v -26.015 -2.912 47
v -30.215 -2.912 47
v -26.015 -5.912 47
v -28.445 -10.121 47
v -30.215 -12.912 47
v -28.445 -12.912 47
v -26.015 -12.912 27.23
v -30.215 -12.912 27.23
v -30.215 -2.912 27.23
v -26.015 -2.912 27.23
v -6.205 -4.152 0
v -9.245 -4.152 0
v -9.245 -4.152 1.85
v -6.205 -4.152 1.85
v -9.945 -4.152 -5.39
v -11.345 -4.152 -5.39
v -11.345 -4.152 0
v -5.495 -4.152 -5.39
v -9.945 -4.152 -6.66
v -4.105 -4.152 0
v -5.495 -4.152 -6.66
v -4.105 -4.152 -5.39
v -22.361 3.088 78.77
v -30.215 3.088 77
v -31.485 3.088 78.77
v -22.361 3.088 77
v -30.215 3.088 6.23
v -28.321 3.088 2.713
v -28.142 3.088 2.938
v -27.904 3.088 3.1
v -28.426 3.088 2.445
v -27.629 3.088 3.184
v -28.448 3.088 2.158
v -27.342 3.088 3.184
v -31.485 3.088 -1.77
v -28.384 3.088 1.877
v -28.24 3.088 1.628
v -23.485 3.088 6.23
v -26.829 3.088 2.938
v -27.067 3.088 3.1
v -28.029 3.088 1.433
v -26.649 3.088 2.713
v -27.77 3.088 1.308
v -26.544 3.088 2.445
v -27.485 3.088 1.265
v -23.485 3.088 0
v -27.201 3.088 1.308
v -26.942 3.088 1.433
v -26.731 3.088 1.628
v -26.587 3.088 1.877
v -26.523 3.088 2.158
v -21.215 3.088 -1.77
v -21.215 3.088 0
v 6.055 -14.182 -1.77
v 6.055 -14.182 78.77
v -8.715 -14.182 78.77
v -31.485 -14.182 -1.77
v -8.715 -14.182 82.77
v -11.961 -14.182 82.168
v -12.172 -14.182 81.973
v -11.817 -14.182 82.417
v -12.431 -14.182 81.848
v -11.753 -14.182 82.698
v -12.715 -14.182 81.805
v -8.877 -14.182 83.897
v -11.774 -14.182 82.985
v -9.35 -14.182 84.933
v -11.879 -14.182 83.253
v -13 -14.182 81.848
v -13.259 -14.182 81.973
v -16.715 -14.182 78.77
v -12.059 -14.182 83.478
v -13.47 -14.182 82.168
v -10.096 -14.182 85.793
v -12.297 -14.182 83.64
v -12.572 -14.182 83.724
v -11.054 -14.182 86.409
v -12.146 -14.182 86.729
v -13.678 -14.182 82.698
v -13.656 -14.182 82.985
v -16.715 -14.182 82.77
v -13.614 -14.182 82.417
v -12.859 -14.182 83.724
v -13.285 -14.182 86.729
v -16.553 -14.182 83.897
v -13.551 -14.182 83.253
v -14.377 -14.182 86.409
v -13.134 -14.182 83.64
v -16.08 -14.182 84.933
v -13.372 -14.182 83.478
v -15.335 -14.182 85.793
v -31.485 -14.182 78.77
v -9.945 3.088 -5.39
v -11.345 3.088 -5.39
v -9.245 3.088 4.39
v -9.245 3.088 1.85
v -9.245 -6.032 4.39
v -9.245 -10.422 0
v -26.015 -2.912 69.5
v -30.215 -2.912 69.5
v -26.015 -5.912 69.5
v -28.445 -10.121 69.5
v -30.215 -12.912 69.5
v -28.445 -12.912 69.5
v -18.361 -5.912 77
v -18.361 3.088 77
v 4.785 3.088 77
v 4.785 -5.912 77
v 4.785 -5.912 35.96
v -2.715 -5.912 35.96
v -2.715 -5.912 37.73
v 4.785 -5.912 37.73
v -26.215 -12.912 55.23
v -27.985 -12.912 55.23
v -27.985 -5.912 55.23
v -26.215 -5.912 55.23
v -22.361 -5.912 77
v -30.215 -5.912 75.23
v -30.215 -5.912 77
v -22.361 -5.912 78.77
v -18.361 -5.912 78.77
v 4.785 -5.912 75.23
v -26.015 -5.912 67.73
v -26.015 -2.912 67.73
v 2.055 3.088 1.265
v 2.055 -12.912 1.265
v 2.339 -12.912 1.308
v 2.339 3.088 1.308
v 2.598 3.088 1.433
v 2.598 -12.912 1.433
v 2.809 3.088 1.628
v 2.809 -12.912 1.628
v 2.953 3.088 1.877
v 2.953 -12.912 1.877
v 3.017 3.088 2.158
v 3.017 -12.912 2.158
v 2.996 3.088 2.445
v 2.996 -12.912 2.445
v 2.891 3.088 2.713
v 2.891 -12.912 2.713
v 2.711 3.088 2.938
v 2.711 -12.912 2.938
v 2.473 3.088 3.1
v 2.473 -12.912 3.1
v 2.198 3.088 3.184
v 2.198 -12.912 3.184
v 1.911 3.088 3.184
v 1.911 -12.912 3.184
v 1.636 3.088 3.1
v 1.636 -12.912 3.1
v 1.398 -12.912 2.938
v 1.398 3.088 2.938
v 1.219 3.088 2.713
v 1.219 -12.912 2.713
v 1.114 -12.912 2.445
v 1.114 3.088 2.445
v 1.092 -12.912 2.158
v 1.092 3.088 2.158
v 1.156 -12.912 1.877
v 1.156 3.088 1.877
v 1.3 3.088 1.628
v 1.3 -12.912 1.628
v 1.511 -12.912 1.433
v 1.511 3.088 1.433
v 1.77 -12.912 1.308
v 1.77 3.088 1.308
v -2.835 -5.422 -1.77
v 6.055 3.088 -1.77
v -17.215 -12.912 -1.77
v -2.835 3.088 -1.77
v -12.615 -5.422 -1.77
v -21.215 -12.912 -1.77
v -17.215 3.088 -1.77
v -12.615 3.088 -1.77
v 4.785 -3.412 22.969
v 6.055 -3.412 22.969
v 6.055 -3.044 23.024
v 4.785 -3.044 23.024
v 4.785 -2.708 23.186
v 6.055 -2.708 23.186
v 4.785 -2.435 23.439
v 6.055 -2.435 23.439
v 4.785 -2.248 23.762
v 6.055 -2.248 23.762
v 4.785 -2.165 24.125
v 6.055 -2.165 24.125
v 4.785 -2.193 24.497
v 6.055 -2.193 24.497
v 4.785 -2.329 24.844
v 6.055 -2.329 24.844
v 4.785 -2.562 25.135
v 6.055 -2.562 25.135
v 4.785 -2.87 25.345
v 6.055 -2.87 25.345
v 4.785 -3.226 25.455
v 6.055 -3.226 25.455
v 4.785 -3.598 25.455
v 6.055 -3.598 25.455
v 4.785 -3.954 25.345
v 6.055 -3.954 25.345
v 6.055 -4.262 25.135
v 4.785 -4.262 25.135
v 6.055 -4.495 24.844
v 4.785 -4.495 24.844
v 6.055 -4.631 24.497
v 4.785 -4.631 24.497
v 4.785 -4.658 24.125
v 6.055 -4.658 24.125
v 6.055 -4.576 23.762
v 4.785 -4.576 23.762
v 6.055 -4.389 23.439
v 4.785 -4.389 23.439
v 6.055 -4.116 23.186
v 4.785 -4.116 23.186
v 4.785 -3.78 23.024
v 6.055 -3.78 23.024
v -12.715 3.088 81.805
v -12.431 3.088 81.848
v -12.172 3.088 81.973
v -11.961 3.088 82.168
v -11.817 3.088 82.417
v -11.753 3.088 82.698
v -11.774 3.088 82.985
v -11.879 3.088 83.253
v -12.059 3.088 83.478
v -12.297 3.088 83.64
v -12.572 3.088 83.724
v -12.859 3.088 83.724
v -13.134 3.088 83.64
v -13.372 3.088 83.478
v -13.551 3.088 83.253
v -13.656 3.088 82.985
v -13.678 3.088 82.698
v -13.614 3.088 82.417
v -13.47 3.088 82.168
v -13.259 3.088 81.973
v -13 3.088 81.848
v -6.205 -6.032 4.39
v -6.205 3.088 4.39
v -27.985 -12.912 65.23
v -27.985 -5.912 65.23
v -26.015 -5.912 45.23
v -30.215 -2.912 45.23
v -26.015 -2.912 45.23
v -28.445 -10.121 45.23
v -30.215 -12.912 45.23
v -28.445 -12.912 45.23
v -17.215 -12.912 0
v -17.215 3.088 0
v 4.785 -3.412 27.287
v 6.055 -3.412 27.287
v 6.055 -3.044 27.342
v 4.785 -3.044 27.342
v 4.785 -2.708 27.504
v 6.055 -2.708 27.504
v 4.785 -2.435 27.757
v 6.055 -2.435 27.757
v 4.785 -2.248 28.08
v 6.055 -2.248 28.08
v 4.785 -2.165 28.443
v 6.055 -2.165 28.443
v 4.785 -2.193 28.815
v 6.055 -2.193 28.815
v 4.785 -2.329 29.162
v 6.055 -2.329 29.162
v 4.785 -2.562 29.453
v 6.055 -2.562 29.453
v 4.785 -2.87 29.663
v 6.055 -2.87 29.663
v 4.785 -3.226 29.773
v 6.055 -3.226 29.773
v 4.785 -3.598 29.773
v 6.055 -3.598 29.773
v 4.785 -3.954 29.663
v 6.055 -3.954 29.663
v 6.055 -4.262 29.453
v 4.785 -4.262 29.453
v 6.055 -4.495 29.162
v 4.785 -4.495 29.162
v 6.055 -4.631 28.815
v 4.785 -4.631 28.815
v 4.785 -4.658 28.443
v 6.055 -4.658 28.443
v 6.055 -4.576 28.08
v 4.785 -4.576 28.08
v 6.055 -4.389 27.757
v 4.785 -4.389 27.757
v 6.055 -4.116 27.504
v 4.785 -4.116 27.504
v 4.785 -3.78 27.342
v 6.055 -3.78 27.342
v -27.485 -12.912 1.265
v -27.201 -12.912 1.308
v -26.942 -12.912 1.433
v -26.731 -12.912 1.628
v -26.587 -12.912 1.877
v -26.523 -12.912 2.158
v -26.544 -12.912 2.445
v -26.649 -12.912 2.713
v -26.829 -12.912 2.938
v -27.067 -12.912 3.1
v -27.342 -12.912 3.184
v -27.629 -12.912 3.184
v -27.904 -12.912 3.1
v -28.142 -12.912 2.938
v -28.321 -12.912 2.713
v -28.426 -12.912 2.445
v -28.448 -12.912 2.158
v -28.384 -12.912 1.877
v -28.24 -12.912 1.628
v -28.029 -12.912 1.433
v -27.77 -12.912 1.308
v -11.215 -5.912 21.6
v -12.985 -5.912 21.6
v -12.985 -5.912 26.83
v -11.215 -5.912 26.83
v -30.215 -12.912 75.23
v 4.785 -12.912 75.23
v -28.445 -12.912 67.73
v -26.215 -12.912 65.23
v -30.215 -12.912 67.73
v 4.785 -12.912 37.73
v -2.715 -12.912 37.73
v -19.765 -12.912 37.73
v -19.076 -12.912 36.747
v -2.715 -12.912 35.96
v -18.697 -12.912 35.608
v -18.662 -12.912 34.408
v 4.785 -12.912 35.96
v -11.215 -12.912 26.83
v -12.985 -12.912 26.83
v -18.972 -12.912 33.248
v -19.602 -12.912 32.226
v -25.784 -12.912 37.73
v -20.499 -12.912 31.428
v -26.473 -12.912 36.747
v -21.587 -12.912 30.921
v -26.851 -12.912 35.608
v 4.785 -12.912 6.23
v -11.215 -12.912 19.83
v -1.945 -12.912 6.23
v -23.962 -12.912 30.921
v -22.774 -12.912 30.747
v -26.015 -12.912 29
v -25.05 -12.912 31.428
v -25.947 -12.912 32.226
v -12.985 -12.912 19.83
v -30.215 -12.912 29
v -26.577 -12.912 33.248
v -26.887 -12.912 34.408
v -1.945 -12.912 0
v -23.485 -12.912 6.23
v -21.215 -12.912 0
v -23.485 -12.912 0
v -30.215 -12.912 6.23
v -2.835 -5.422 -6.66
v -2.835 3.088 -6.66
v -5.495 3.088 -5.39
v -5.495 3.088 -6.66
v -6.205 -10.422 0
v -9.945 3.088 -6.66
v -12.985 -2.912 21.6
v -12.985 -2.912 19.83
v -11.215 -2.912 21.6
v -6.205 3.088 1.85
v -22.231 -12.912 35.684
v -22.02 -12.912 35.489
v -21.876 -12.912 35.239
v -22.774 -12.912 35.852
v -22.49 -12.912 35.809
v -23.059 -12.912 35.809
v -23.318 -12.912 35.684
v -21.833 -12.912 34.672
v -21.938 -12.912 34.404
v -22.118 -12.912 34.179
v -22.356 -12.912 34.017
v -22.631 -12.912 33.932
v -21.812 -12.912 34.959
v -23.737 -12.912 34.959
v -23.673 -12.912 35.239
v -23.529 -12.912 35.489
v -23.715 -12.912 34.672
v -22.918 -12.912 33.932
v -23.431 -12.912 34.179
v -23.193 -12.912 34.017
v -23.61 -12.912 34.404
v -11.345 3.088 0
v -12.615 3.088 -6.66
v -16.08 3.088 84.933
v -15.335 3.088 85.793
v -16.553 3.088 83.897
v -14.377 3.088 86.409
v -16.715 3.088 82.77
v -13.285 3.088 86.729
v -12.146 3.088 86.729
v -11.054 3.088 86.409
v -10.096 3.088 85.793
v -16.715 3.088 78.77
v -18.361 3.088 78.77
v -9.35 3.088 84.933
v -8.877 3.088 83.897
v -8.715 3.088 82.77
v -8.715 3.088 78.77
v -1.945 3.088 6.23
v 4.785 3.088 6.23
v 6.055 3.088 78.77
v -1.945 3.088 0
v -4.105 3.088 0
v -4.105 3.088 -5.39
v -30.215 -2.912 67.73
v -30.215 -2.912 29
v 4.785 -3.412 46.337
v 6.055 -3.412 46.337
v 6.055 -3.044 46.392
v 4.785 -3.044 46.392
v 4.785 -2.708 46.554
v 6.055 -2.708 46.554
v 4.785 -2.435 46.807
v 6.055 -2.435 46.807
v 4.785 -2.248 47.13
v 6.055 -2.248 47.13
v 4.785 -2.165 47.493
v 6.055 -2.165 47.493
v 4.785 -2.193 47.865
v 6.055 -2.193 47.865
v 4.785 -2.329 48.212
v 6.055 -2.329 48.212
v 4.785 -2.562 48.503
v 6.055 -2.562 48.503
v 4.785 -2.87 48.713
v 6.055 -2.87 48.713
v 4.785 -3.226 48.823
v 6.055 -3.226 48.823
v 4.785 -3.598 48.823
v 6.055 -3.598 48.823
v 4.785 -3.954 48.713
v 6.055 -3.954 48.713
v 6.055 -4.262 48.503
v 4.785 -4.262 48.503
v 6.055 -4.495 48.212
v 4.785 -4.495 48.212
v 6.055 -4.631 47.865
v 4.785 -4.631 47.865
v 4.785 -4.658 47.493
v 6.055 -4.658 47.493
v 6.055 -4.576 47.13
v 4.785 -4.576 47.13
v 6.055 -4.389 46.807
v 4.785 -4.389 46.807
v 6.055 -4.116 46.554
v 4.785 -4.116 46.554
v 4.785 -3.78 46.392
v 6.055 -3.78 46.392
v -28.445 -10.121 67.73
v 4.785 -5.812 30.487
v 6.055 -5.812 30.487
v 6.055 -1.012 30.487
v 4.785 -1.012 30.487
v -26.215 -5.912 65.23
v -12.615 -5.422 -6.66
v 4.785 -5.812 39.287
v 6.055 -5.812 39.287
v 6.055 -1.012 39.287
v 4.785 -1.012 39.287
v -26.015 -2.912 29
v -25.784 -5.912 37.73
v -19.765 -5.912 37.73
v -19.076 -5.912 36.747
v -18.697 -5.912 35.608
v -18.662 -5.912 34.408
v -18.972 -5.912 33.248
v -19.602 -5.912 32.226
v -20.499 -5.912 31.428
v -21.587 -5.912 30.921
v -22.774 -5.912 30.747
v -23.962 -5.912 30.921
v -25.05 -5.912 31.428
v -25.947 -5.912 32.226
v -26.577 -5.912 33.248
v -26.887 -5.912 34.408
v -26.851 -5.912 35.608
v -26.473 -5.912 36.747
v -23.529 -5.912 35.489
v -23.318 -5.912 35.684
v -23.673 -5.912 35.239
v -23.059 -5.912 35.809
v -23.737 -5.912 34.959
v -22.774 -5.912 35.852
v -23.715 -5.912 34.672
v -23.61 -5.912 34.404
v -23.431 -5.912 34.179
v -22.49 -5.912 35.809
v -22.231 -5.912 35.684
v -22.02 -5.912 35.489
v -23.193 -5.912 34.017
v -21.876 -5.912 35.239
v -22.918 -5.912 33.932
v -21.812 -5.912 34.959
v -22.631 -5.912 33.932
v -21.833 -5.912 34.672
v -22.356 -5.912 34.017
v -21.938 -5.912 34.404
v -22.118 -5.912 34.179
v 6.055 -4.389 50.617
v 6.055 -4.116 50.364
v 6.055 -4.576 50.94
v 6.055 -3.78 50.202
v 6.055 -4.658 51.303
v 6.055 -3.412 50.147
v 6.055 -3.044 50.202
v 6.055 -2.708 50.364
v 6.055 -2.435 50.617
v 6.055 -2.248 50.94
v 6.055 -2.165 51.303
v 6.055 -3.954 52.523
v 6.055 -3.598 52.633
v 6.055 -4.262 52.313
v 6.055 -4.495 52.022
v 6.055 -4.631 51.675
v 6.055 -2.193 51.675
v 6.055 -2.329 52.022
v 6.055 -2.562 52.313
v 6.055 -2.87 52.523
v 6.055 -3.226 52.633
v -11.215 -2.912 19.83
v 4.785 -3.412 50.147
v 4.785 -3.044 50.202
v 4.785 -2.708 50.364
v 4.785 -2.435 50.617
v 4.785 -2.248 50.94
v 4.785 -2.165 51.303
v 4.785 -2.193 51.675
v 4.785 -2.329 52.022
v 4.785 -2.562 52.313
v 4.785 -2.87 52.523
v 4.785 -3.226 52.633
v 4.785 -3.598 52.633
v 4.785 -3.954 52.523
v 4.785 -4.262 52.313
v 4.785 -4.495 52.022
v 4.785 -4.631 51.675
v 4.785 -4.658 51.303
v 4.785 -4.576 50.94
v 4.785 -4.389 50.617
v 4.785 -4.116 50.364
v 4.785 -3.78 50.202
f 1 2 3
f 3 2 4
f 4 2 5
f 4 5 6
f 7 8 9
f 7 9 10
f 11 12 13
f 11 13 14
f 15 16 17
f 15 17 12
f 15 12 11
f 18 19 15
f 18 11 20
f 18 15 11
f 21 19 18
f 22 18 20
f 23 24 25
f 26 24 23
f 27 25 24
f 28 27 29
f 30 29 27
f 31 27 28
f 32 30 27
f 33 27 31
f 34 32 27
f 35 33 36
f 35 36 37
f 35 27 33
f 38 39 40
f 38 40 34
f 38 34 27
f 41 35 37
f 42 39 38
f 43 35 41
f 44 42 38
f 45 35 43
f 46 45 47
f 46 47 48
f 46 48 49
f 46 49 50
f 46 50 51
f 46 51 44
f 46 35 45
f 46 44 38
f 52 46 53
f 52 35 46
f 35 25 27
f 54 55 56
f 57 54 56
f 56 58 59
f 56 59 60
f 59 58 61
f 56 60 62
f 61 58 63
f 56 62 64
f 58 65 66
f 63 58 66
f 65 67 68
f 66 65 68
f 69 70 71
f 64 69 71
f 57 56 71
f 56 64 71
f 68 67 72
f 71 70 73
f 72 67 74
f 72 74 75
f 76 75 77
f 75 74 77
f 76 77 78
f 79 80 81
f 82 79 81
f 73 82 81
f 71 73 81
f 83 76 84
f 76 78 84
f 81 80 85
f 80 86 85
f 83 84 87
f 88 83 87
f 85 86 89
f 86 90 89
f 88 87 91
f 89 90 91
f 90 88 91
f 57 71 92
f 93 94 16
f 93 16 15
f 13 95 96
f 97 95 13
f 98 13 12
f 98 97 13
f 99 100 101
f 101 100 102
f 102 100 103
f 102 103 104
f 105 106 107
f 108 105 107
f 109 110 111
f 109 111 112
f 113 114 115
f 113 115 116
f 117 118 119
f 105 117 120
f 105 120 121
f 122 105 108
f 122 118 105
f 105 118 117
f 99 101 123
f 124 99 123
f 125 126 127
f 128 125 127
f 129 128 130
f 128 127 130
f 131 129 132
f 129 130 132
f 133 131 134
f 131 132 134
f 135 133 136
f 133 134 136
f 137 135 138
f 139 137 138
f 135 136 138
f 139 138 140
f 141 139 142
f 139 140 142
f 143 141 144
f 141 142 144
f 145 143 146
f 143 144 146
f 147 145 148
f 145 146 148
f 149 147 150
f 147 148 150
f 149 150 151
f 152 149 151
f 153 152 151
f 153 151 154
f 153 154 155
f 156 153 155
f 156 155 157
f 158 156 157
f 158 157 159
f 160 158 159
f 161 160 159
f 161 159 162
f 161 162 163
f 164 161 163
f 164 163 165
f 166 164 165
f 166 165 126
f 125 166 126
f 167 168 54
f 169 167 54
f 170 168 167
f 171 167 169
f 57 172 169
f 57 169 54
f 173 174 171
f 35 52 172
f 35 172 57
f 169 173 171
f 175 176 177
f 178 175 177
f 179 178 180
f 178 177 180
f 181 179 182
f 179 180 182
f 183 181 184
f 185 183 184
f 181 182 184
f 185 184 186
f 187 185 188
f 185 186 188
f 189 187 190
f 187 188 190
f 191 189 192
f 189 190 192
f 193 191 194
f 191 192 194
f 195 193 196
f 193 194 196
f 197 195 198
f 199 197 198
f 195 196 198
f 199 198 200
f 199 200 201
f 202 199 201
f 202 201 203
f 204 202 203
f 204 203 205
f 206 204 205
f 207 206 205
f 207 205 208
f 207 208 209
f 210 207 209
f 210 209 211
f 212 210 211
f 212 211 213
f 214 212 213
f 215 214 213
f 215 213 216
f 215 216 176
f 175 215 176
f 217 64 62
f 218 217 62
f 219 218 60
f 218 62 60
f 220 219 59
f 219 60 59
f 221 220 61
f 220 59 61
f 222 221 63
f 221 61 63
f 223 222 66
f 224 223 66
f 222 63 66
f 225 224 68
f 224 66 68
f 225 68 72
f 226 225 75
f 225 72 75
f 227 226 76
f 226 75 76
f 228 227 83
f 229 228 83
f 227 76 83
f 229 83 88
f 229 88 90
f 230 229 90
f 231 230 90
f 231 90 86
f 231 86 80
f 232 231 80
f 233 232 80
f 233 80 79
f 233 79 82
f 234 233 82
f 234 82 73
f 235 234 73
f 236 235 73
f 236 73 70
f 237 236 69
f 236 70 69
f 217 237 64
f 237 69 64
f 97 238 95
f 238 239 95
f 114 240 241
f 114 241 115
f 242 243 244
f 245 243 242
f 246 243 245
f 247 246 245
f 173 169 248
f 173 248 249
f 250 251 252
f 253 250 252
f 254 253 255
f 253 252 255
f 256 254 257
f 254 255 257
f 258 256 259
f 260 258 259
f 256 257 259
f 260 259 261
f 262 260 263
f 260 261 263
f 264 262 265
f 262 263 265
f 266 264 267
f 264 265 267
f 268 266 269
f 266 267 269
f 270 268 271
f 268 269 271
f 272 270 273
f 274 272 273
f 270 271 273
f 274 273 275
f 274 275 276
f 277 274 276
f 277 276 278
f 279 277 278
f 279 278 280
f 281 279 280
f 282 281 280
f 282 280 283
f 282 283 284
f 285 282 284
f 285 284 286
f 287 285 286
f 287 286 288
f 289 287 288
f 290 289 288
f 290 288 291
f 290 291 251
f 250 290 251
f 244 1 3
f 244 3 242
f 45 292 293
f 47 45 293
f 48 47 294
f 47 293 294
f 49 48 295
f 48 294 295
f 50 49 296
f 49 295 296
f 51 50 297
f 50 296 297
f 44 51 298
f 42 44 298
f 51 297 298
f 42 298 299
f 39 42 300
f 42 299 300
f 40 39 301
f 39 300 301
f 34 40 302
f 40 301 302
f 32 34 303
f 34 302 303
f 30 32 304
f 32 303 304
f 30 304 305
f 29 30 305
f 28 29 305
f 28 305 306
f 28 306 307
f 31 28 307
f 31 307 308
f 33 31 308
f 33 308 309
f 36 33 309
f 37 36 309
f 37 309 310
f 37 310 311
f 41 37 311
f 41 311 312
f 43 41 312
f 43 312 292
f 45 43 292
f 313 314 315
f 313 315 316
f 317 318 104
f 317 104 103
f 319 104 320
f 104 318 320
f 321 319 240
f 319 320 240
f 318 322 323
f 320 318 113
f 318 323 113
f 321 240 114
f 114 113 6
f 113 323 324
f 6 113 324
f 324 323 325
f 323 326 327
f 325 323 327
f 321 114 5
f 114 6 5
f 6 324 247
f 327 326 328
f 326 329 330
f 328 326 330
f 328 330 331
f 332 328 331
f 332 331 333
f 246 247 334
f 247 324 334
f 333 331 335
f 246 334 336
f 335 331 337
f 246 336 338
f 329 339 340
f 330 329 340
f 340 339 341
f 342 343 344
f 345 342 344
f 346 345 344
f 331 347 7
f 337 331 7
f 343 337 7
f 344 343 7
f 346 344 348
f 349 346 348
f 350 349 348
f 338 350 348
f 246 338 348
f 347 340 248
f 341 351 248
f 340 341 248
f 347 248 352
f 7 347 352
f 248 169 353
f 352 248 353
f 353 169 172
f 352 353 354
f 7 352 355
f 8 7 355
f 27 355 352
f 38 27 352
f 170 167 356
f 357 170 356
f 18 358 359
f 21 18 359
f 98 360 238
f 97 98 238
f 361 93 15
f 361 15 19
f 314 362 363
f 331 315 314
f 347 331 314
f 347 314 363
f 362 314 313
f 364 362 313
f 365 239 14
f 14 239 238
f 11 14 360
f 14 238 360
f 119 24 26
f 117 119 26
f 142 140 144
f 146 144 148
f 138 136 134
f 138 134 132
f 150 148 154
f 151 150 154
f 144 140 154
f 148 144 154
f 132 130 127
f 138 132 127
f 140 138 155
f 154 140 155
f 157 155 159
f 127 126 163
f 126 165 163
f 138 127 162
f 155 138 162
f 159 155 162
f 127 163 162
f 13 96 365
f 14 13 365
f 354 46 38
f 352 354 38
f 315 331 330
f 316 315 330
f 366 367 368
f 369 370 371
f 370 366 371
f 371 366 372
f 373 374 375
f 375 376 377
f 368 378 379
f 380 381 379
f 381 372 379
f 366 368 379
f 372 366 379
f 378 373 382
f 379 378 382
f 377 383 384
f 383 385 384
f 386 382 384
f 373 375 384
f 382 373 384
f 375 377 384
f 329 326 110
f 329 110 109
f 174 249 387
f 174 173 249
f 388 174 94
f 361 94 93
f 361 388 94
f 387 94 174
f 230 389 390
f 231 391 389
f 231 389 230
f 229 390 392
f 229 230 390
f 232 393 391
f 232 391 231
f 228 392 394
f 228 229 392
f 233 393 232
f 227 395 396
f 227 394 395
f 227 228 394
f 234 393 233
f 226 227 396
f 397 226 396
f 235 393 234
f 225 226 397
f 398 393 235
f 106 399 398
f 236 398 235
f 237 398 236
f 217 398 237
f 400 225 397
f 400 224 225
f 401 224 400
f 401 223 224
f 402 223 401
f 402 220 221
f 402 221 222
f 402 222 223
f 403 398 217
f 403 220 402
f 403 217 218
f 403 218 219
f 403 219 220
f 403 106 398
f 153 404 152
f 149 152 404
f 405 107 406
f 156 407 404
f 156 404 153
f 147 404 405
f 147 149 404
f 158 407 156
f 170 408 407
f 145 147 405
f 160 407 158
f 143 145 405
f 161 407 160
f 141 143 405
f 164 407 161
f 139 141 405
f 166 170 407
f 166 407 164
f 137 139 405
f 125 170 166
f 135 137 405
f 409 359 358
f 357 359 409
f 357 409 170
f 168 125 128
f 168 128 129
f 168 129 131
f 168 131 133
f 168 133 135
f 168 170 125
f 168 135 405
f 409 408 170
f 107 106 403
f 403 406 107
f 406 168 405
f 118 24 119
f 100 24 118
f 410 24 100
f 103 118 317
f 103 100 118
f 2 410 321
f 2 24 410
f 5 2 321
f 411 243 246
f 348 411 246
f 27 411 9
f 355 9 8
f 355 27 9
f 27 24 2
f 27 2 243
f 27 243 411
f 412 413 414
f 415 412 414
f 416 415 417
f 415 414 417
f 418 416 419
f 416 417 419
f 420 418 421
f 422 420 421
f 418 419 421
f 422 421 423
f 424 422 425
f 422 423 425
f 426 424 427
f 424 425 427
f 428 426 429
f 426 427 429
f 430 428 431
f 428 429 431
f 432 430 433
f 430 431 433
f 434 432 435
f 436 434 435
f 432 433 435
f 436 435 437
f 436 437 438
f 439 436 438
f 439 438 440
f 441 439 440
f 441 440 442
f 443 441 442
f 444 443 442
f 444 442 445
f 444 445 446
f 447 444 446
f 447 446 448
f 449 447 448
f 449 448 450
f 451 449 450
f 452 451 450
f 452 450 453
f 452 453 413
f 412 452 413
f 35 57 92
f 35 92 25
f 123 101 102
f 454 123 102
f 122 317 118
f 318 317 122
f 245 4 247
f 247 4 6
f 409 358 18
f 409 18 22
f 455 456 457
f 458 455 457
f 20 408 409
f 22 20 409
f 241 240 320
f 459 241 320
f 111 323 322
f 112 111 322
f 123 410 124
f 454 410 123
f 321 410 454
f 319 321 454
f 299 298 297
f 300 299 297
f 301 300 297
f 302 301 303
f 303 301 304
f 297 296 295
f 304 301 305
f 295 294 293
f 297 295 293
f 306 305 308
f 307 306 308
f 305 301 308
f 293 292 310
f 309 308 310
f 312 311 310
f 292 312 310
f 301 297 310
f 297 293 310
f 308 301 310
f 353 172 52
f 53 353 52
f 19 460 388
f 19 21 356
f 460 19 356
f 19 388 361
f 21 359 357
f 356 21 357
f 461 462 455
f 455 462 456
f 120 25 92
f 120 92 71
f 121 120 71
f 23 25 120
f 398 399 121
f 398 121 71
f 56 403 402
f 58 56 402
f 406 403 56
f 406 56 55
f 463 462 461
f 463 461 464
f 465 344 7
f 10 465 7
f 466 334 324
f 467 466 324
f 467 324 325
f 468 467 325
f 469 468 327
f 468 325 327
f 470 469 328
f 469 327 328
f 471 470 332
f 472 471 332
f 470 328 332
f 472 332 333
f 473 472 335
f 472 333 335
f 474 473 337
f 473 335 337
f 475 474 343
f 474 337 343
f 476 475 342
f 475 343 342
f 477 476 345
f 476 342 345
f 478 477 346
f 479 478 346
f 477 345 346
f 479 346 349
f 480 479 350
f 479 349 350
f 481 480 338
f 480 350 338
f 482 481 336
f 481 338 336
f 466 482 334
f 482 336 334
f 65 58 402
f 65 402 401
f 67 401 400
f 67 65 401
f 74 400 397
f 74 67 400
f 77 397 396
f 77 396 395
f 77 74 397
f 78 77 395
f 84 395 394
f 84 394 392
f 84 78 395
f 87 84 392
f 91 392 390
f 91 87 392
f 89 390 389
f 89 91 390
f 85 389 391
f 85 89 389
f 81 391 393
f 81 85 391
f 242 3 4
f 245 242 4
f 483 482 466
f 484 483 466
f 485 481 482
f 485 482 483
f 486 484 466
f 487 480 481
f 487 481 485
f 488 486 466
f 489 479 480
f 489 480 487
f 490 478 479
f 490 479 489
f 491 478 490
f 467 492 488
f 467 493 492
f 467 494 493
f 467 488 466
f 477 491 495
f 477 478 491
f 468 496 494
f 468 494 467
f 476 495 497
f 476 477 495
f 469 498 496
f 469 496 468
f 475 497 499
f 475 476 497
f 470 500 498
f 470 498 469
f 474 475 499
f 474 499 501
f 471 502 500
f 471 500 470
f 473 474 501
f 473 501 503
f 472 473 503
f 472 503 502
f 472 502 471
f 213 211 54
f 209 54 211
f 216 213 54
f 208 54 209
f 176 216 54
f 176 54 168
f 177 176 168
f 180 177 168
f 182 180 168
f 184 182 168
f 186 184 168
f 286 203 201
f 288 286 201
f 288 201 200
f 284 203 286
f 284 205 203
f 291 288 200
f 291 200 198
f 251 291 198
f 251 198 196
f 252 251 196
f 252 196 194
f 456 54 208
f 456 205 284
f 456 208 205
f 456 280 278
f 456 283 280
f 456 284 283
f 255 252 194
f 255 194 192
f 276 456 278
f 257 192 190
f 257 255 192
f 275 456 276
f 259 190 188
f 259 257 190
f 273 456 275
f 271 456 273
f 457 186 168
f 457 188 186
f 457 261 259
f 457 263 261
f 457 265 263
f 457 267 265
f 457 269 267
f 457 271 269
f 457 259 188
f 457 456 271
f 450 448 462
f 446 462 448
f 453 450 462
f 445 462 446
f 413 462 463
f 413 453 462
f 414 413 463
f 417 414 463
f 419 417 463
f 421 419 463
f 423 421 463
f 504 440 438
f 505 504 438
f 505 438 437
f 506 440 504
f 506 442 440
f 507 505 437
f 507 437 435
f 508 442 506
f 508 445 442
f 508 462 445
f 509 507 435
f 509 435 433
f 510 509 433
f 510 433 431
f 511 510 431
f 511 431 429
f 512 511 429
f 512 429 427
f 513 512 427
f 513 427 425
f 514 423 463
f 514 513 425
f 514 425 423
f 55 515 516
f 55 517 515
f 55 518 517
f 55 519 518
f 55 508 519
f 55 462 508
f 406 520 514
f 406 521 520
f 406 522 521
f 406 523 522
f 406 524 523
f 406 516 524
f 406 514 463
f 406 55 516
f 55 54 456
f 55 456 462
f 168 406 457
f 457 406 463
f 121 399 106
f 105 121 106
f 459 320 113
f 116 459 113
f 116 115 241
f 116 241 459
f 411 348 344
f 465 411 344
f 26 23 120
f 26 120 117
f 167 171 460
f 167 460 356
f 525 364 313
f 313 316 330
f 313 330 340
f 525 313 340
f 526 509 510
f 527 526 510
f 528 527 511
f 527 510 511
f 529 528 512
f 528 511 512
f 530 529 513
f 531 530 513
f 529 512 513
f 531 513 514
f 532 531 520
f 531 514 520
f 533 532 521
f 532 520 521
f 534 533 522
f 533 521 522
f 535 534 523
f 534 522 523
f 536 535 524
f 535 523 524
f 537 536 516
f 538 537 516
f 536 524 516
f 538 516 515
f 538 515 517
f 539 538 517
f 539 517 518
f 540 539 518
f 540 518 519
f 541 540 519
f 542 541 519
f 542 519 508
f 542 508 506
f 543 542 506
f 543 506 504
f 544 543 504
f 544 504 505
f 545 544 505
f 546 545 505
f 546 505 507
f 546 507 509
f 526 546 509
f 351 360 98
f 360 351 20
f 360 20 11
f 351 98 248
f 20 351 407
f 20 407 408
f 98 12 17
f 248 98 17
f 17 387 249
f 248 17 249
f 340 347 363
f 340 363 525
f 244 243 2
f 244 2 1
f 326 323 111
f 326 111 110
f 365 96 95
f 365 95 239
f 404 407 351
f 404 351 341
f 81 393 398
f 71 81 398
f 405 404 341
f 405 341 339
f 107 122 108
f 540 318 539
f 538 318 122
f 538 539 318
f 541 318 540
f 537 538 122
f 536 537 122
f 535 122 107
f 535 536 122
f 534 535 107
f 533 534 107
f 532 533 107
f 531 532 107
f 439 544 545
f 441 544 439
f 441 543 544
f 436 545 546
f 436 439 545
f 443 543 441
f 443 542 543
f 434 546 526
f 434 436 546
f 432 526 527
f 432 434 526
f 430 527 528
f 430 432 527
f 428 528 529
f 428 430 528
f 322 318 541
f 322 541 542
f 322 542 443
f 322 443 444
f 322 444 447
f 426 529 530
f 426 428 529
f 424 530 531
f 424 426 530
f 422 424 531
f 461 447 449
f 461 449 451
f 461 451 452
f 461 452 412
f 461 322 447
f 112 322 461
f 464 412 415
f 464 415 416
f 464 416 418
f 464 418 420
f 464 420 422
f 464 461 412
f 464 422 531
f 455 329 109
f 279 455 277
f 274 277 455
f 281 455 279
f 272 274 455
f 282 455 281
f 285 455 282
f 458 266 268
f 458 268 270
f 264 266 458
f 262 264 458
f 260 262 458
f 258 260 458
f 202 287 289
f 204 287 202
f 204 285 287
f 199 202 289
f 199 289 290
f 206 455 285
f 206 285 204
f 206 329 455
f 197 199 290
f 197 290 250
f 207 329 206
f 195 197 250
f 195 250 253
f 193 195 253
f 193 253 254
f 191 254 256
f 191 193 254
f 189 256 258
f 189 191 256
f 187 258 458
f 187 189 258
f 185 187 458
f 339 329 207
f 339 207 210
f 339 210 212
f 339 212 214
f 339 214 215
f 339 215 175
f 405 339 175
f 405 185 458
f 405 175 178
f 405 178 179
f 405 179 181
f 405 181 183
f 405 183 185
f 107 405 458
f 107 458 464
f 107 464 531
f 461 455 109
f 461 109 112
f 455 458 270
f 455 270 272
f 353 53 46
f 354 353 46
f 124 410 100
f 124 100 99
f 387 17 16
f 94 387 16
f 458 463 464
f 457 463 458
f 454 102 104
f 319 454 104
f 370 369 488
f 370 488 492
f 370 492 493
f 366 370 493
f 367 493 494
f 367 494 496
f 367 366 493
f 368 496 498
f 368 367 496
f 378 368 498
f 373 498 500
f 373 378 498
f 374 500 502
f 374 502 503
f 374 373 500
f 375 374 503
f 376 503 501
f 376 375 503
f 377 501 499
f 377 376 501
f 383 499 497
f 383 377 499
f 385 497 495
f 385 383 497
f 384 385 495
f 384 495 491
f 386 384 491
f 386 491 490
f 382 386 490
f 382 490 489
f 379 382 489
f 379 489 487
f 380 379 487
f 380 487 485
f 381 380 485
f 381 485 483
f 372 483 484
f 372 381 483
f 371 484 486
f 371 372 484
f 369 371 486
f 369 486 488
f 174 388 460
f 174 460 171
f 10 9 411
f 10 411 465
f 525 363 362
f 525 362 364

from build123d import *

# Parameters (mm, degrees)
BOSS_EXTRUDE1_DEPTH            = 77
SKETCH3_W                      = 37.54
SKETCH3_H                      = 17.27
BOSS_EXTRUDE2_DEPTH            = 1.77
SKETCH4_W                      = 37.54
SKETCH4_H                      = 17.27
BOSS_EXTRUDE3_DEPTH            = 1.77
SKETCH5_W                      = 4
SKETCH5_H                      = 16
CUT_EXTRUDE2_DEPTH             = 1.77
SKETCH6_W                      = 9.78
SKETCH6_H                      = 11.05
SKETCH6_W_2                    = 7.24
SKETCH6_H_2                    = 7.24
BUTTON_WALLS_DEPTH             = 7.24
SKETCH7_W                      = 9.78
SKETCH7_H                      = 11.05
BUTTON_BOTTOM_DEPTH            = 1.27
SKETCH8_W                      = 7.24
SKETCH8_H                      = 1.77
BUTTON_CUTOUT_MIDDLE_DEPTH     = 7.24
SKETCH9_W                      = 4.45
SKETCH9_H                      = 1.27
SKETCH9_W_2                    = 3.37
SKETCH9_H_2                    = 4.39
BUTTON_CUTOUT_FRONT_BACK_DEPTH = 7.24
SKETCH10_W                     = 3.37
SKETCH10_H                     = 4.39
BUTTON_CUTOUT_BOTTOM_DEPTH     = 1.27
BUTTON_CHAMFER1_SIZE           = 5
SKETCH12_W                     = 35
SKETCH12_H                     = 1.77
SKETCH12_W_2                   = 1.77
SKETCH12_H_2                   = 10
SKETCH12_W_3                   = 7.5
SKETCH12_R                     = 0.9652
SKETCH12_H_3                   = 7
SUPPORT_PCB_BATTERY_DEPTH      = 7
SKETCH13_R                     = 1.25
SKETCH13_W                     = 8.8
SKETCH13_H                     = 4.8
CUTOUT_USB_3_LEDS_DEPTH        = 1.77
SKETCH16_W                     = 1.77
SKETCH16_H                     = 1.77
TAB_PCB_RETAINER_LEN_DEPTH     = 3
SKETCH17_W                     = 4
SKETCH17_H                     = 1.77
CUTOUT_BACK_MOT_WIRES_DEPTH    = 9
SKETCH18_R                     = 1.25
CUTOUT_CHG_DONE_LED_DEPTH      = 10
SKETCH19_W                     = 4.2
SKETCH19_H                     = 1.77
TAB_PCB_RETAINERS_WIDTH_DEPTH  = 10
CUTOUT_RETAINER_TAB_1_DEPTH    = 1.77
CUTOUT_RETAINER_TAB_2_DEPTH    = 1.77
SKETCH23_W                     = 8
SKETCH23_H                     = 8
SKETCH23_R                     = 0.9652
CASING_SCREW_POSTS_DEPTH       = 17.27


with BuildPart() as part:
    # Sketch2 → Boss-Extrude1 (new body)
    with BuildSketch(Plane.XY):
        Polygon((-30.215355805, 3.088014981), (-30.215355805, -12.911985019), (4.784644195, -12.911985019), (4.784644195, 3.088014981), (6.054644195, 3.088014981), (6.054644195, -14.181985019), (-31.485355805, -14.181985019), (-31.485355805, 3.088014981), align=None)
    extrude(amount=BOSS_EXTRUDE1_DEPTH)

    # Sketch3 → Boss-Extrude2 (add)
    with BuildSketch(Plane.XY.offset(77)):
        with Locations((-12.715355805, -5.546985019)):
            Rectangle(SKETCH3_W, SKETCH3_H)
    extrude(amount=BOSS_EXTRUDE2_DEPTH)

    # Sketch4 → Boss-Extrude3 (add)
    with BuildSketch(Plane(origin=(0, 0, 0), x_dir=(-1, 0, 0), z_dir=(0, 0, -1))):
        with Locations((12.715355805, -5.546985019)):
            Rectangle(SKETCH4_W, SKETCH4_H)
    extrude(amount=BOSS_EXTRUDE3_DEPTH)

    # Sketch5 → Cut-Extrude2 (cut)
    with BuildSketch(Plane(origin=(0, 0, -1.77), x_dir=(-1, 0, 0), z_dir=(0, 0, -1))):
        with Locations((19.215355805, -4.911985019)):
            Rectangle(SKETCH5_W, SKETCH5_H)
    extrude(amount=-CUT_EXTRUDE2_DEPTH, mode=Mode.SUBTRACT)

    # Sketch6 → button_walls (add)
    with BuildSketch(Plane(origin=(0, 3.088014981, 0), x_dir=(1, 0, 0), z_dir=(0, 1, 0))):
        with Locations((-7.725355805, 1.135)):
            Rectangle(SKETCH6_W, SKETCH6_H)
        with Locations((-7.725355805, 1.77)):
            Rectangle(SKETCH6_W_2, SKETCH6_H_2, mode=Mode.SUBTRACT)
    extrude(amount=-BUTTON_WALLS_DEPTH)

    # Sketch7 → button_bottom (add)
    with BuildSketch(Plane.XZ.offset(4.151985019)):
        with Locations((-7.725355805, -1.135)):
            Rectangle(SKETCH7_W, SKETCH7_H)
    extrude(amount=BUTTON_BOTTOM_DEPTH)

    # Sketch8 → button_cutout_middle (cut)
    with BuildSketch(Plane(origin=(0, 3.088014981, 0), x_dir=(1, 0, 0), z_dir=(0, 1, 0))):
        with Locations((-7.725355805, 0.885)):
            Rectangle(SKETCH8_W, SKETCH8_H)
    extrude(amount=-BUTTON_CUTOUT_MIDDLE_DEPTH, mode=Mode.SUBTRACT)

    # Sketch9 → button_cutout_front_back (cut)
    with BuildSketch(Plane(origin=(0, 3.088014981, 0), x_dir=(1, 0, 0), z_dir=(0, 1, 0))):
        with Locations((-7.720355805, 6.025)):
            Rectangle(SKETCH9_W, SKETCH9_H)
        with Locations((-10.930355805, -2.195)):
            Rectangle(SKETCH9_W_2, SKETCH9_H_2)
        with Locations((-4.520355805, -2.195)):
            Rectangle(SKETCH9_W_2, SKETCH9_H_2)
    extrude(amount=-BUTTON_CUTOUT_FRONT_BACK_DEPTH, mode=Mode.SUBTRACT)

    # Sketch10 → button_cutout_bottom (cut)
    with BuildSketch(Plane(origin=(0, -4.151985019, 0), x_dir=(1, 0, 0), z_dir=(0, 1, 0))):
        with Locations((-10.930355805, -2.195)):
            Rectangle(SKETCH10_W, SKETCH10_H)
        with Locations((-4.520355805, -2.195)):
            Rectangle(SKETCH10_W, SKETCH10_H)
    extrude(amount=-BUTTON_CUTOUT_BOTTOM_DEPTH, mode=Mode.SUBTRACT)

    # button_Chamfer1
    # the kernel refuses this chamfer: 5 mm, written as the material it adds along each edge
    with BuildSketch(Plane(origin=(-6.205355805, -5.421985019, 0), x_dir=(0, -0.9996219169112968, -0.027495876610586372), z_dir=(-1, 0, 0))) as button_chamfer1_piece_1_section:
        Polygon((BUTTON_CHAMFER1_SIZE * 0.999621916911, BUTTON_CHAMFER1_SIZE * 0.0274958766106), (-BUTTON_CHAMFER1_SIZE * 0.0274958766106, BUTTON_CHAMFER1_SIZE * 0.999621916911), (0, 0), align=None)
    button_chamfer1_piece_1 = extrude(amount=3.04, mode=Mode.PRIVATE)
    button_chamfer1_piece_1 = split(button_chamfer1_piece_1, bisect_by=Plane(origin=(-7.725355805, -7.110612501, 4.39), z_dir=(0, 0, -1)), keep=Keep.TOP, mode=Mode.PRIVATE)
    add(button_chamfer1_piece_1)

    # Sketch12 → support_pcb_battery (add)
    # profile 1 of 5: a face of its own
    with BuildSketch(Plane(origin=(0, -12.911985019, 0), x_dir=(1, 0, 0), z_dir=(0, 1, 0))):
        with Locations((-12.715355805, -76.115)):
            Rectangle(SKETCH12_W, SKETCH12_H)
    # profile 2 of 5: a face of its own
    with BuildSketch(Plane(origin=(0, -12.911985019, 0), x_dir=(1, 0, 0), z_dir=(0, 1, 0))):
        with Locations((-27.100355805, -60.23)):
            Rectangle(SKETCH12_W_2, SKETCH12_H_2)
    # profile 3 of 5: a face of its own
    with BuildSketch(Plane(origin=(0, -12.911985019, 0), x_dir=(1, 0, 0), z_dir=(0, 1, 0))):
        with Locations((1.034644195, -36.845)):
            Rectangle(SKETCH12_W_3, SKETCH12_H)
    # profile 4 of 5: a face of its own
    with BuildSketch(Plane(origin=(0, -12.911985019, 0), x_dir=(1, 0, 0), z_dir=(0, 1, 0))):
        with BuildLine():
            Line((-25.783918863, -37.73), (-19.764792747, -37.73))
            ThreePointArc((-19.764792747, -37.73), (-22.774355805, -30.7466), (-25.783918863, -37.73))
        make_face()
        with Locations(Location((-22.774355805, -34.8868, 0), (0, 0, 270))):
            Circle(SKETCH12_R, mode=Mode.SUBTRACT)
    # profile 5 of 5: a face of its own
    with BuildSketch(Plane(origin=(0, -12.911985019, 0), x_dir=(1, 0, 0), z_dir=(0, 1, 0))):
        with Locations((-12.100355805, -23.33)):
            Rectangle(SKETCH12_W_2, SKETCH12_H_3)
    extrude(amount=SUPPORT_PCB_BATTERY_DEPTH)

    # Sketch13 → cutout_usb_3_leds (cut)
    with BuildSketch(Plane(origin=(6.054644195, 0, 0), x_dir=(0, 0, -1), z_dir=(1, 0, 0))):
        with Locations((-51.3968, -3.411985019)):
            Circle(SKETCH13_R)
        with Locations((-47.5868, -3.411985019)):
            Circle(SKETCH13_R)
        with Locations((-24.2188, -3.411985019)):
            Circle(SKETCH13_R)
        with Locations((-34.8868, -3.411985019)):
            Rectangle(SKETCH13_W, SKETCH13_H)
    extrude(amount=-CUTOUT_USB_3_LEDS_DEPTH, mode=Mode.SUBTRACT)

    # Sketch16 → tab_pcb_retainer_len (add)
    with BuildSketch(Plane(origin=(0, -5.911985019, 0), x_dir=(1, 0, 0), z_dir=(0, 1, 0))):
        with Locations((-12.100355805, -20.715)):
            Rectangle(SKETCH16_W, SKETCH16_H)
    extrude(amount=TAB_PCB_RETAINER_LEN_DEPTH)

    # Sketch17 → cutout_back_mot_wires (cut)
    with BuildSketch(Plane(origin=(0, 3.088014981, 0), x_dir=(1, 0, 0), z_dir=(0, 1, 0))):
        with Locations((-20.361355805, -77.885)):
            Rectangle(SKETCH17_W, SKETCH17_H)
    extrude(amount=-CUTOUT_BACK_MOT_WIRES_DEPTH, mode=Mode.SUBTRACT)

    # Sketch18 → cutout_chg_done_led (cut)
    with BuildSketch(Plane(origin=(6.054644195, 0, 0), x_dir=(0, 0, -1), z_dir=(1, 0, 0))):
        with Locations((-28.5368, -3.411985019)):
            Circle(SKETCH18_R)
    extrude(amount=-CUTOUT_CHG_DONE_LED_DEPTH, mode=Mode.SUBTRACT)

    # Sketch19 → tab_pcb_retainers_width (add)
    with BuildSketch(Plane(origin=(0, -12.911985019, 0), x_dir=(1, 0, 0), z_dir=(0, 1, 0))):
        with Locations((-28.115355805, -68.615)):
            Rectangle(SKETCH19_W, SKETCH19_H)
        with Locations((-28.115355805, -46.115)):
            Rectangle(SKETCH19_W, SKETCH19_H)
        with Locations((-28.115355805, -28.115)):
            Rectangle(SKETCH19_W, SKETCH19_H)
    extrude(amount=TAB_PCB_RETAINERS_WIDTH_DEPTH)

    # Sketch20 → cutout_retainer_tab_1 (cut)
    with BuildSketch(Plane.XY.offset(69.5)):
        Polygon((-26.015355805, -12.911985019), (-26.015355805, -5.911985019), (-28.445355805, -10.120868481), (-28.445355805, -12.911985019), align=None)
    extrude(amount=-CUTOUT_RETAINER_TAB_1_DEPTH, mode=Mode.SUBTRACT)

    # Sketch21 → cutout_retainer_tab_2 (cut)
    with BuildSketch(Plane.XY.offset(47)):
        Polygon((-26.015355805, -5.911985019), (-28.445355805, -10.120868481), (-28.445355805, -12.911985019), (-26.015355805, -12.911985019), align=None)
    extrude(amount=-CUTOUT_RETAINER_TAB_2_DEPTH, mode=Mode.SUBTRACT)

    # Sketch23 → casing_screw_posts (add)
    # profile 1 of 3: a face of its own
    with BuildSketch(Plane.XZ.offset(14.181985019)):
        with Locations((2.054644195, 2.23)):
            Rectangle(SKETCH23_W, SKETCH23_H)
        with Locations(Location((2.054644195, 2.23, 0), (0, 0, 270))):
            Circle(SKETCH23_R, mode=Mode.SUBTRACT)
    # profile 2 of 3: a face of its own
    with BuildSketch(Plane.XZ.offset(14.181985019)):
        with Locations((-27.485355805, 2.23)):
            Rectangle(SKETCH23_W, SKETCH23_H)
        with Locations(Location((-27.485355805, 2.23, 0), (0, 0, 270))):
            Circle(SKETCH23_R, mode=Mode.SUBTRACT)
    # profile 3 of 3: a face of its own
    with BuildSketch(Plane.XZ.offset(14.181985019)):
        with BuildLine():
            Line((-16.715355805, 82.77), (-16.715355805, 78.77))
            Line((-16.715355805, 78.77), (-8.715355805, 78.77))
            Line((-8.715355805, 78.77), (-8.715355805, 82.77))
            ThreePointArc((-8.715355805, 82.77), (-12.715355805, 86.77), (-16.715355805, 82.77))
        make_face()
        with Locations(Location((-12.715355805, 82.77, 0), (0, 0, 270))):
            Circle(SKETCH23_R, mode=Mode.SUBTRACT)
    extrude(amount=-CASING_SCREW_POSTS_DEPTH)


solid = part.part
